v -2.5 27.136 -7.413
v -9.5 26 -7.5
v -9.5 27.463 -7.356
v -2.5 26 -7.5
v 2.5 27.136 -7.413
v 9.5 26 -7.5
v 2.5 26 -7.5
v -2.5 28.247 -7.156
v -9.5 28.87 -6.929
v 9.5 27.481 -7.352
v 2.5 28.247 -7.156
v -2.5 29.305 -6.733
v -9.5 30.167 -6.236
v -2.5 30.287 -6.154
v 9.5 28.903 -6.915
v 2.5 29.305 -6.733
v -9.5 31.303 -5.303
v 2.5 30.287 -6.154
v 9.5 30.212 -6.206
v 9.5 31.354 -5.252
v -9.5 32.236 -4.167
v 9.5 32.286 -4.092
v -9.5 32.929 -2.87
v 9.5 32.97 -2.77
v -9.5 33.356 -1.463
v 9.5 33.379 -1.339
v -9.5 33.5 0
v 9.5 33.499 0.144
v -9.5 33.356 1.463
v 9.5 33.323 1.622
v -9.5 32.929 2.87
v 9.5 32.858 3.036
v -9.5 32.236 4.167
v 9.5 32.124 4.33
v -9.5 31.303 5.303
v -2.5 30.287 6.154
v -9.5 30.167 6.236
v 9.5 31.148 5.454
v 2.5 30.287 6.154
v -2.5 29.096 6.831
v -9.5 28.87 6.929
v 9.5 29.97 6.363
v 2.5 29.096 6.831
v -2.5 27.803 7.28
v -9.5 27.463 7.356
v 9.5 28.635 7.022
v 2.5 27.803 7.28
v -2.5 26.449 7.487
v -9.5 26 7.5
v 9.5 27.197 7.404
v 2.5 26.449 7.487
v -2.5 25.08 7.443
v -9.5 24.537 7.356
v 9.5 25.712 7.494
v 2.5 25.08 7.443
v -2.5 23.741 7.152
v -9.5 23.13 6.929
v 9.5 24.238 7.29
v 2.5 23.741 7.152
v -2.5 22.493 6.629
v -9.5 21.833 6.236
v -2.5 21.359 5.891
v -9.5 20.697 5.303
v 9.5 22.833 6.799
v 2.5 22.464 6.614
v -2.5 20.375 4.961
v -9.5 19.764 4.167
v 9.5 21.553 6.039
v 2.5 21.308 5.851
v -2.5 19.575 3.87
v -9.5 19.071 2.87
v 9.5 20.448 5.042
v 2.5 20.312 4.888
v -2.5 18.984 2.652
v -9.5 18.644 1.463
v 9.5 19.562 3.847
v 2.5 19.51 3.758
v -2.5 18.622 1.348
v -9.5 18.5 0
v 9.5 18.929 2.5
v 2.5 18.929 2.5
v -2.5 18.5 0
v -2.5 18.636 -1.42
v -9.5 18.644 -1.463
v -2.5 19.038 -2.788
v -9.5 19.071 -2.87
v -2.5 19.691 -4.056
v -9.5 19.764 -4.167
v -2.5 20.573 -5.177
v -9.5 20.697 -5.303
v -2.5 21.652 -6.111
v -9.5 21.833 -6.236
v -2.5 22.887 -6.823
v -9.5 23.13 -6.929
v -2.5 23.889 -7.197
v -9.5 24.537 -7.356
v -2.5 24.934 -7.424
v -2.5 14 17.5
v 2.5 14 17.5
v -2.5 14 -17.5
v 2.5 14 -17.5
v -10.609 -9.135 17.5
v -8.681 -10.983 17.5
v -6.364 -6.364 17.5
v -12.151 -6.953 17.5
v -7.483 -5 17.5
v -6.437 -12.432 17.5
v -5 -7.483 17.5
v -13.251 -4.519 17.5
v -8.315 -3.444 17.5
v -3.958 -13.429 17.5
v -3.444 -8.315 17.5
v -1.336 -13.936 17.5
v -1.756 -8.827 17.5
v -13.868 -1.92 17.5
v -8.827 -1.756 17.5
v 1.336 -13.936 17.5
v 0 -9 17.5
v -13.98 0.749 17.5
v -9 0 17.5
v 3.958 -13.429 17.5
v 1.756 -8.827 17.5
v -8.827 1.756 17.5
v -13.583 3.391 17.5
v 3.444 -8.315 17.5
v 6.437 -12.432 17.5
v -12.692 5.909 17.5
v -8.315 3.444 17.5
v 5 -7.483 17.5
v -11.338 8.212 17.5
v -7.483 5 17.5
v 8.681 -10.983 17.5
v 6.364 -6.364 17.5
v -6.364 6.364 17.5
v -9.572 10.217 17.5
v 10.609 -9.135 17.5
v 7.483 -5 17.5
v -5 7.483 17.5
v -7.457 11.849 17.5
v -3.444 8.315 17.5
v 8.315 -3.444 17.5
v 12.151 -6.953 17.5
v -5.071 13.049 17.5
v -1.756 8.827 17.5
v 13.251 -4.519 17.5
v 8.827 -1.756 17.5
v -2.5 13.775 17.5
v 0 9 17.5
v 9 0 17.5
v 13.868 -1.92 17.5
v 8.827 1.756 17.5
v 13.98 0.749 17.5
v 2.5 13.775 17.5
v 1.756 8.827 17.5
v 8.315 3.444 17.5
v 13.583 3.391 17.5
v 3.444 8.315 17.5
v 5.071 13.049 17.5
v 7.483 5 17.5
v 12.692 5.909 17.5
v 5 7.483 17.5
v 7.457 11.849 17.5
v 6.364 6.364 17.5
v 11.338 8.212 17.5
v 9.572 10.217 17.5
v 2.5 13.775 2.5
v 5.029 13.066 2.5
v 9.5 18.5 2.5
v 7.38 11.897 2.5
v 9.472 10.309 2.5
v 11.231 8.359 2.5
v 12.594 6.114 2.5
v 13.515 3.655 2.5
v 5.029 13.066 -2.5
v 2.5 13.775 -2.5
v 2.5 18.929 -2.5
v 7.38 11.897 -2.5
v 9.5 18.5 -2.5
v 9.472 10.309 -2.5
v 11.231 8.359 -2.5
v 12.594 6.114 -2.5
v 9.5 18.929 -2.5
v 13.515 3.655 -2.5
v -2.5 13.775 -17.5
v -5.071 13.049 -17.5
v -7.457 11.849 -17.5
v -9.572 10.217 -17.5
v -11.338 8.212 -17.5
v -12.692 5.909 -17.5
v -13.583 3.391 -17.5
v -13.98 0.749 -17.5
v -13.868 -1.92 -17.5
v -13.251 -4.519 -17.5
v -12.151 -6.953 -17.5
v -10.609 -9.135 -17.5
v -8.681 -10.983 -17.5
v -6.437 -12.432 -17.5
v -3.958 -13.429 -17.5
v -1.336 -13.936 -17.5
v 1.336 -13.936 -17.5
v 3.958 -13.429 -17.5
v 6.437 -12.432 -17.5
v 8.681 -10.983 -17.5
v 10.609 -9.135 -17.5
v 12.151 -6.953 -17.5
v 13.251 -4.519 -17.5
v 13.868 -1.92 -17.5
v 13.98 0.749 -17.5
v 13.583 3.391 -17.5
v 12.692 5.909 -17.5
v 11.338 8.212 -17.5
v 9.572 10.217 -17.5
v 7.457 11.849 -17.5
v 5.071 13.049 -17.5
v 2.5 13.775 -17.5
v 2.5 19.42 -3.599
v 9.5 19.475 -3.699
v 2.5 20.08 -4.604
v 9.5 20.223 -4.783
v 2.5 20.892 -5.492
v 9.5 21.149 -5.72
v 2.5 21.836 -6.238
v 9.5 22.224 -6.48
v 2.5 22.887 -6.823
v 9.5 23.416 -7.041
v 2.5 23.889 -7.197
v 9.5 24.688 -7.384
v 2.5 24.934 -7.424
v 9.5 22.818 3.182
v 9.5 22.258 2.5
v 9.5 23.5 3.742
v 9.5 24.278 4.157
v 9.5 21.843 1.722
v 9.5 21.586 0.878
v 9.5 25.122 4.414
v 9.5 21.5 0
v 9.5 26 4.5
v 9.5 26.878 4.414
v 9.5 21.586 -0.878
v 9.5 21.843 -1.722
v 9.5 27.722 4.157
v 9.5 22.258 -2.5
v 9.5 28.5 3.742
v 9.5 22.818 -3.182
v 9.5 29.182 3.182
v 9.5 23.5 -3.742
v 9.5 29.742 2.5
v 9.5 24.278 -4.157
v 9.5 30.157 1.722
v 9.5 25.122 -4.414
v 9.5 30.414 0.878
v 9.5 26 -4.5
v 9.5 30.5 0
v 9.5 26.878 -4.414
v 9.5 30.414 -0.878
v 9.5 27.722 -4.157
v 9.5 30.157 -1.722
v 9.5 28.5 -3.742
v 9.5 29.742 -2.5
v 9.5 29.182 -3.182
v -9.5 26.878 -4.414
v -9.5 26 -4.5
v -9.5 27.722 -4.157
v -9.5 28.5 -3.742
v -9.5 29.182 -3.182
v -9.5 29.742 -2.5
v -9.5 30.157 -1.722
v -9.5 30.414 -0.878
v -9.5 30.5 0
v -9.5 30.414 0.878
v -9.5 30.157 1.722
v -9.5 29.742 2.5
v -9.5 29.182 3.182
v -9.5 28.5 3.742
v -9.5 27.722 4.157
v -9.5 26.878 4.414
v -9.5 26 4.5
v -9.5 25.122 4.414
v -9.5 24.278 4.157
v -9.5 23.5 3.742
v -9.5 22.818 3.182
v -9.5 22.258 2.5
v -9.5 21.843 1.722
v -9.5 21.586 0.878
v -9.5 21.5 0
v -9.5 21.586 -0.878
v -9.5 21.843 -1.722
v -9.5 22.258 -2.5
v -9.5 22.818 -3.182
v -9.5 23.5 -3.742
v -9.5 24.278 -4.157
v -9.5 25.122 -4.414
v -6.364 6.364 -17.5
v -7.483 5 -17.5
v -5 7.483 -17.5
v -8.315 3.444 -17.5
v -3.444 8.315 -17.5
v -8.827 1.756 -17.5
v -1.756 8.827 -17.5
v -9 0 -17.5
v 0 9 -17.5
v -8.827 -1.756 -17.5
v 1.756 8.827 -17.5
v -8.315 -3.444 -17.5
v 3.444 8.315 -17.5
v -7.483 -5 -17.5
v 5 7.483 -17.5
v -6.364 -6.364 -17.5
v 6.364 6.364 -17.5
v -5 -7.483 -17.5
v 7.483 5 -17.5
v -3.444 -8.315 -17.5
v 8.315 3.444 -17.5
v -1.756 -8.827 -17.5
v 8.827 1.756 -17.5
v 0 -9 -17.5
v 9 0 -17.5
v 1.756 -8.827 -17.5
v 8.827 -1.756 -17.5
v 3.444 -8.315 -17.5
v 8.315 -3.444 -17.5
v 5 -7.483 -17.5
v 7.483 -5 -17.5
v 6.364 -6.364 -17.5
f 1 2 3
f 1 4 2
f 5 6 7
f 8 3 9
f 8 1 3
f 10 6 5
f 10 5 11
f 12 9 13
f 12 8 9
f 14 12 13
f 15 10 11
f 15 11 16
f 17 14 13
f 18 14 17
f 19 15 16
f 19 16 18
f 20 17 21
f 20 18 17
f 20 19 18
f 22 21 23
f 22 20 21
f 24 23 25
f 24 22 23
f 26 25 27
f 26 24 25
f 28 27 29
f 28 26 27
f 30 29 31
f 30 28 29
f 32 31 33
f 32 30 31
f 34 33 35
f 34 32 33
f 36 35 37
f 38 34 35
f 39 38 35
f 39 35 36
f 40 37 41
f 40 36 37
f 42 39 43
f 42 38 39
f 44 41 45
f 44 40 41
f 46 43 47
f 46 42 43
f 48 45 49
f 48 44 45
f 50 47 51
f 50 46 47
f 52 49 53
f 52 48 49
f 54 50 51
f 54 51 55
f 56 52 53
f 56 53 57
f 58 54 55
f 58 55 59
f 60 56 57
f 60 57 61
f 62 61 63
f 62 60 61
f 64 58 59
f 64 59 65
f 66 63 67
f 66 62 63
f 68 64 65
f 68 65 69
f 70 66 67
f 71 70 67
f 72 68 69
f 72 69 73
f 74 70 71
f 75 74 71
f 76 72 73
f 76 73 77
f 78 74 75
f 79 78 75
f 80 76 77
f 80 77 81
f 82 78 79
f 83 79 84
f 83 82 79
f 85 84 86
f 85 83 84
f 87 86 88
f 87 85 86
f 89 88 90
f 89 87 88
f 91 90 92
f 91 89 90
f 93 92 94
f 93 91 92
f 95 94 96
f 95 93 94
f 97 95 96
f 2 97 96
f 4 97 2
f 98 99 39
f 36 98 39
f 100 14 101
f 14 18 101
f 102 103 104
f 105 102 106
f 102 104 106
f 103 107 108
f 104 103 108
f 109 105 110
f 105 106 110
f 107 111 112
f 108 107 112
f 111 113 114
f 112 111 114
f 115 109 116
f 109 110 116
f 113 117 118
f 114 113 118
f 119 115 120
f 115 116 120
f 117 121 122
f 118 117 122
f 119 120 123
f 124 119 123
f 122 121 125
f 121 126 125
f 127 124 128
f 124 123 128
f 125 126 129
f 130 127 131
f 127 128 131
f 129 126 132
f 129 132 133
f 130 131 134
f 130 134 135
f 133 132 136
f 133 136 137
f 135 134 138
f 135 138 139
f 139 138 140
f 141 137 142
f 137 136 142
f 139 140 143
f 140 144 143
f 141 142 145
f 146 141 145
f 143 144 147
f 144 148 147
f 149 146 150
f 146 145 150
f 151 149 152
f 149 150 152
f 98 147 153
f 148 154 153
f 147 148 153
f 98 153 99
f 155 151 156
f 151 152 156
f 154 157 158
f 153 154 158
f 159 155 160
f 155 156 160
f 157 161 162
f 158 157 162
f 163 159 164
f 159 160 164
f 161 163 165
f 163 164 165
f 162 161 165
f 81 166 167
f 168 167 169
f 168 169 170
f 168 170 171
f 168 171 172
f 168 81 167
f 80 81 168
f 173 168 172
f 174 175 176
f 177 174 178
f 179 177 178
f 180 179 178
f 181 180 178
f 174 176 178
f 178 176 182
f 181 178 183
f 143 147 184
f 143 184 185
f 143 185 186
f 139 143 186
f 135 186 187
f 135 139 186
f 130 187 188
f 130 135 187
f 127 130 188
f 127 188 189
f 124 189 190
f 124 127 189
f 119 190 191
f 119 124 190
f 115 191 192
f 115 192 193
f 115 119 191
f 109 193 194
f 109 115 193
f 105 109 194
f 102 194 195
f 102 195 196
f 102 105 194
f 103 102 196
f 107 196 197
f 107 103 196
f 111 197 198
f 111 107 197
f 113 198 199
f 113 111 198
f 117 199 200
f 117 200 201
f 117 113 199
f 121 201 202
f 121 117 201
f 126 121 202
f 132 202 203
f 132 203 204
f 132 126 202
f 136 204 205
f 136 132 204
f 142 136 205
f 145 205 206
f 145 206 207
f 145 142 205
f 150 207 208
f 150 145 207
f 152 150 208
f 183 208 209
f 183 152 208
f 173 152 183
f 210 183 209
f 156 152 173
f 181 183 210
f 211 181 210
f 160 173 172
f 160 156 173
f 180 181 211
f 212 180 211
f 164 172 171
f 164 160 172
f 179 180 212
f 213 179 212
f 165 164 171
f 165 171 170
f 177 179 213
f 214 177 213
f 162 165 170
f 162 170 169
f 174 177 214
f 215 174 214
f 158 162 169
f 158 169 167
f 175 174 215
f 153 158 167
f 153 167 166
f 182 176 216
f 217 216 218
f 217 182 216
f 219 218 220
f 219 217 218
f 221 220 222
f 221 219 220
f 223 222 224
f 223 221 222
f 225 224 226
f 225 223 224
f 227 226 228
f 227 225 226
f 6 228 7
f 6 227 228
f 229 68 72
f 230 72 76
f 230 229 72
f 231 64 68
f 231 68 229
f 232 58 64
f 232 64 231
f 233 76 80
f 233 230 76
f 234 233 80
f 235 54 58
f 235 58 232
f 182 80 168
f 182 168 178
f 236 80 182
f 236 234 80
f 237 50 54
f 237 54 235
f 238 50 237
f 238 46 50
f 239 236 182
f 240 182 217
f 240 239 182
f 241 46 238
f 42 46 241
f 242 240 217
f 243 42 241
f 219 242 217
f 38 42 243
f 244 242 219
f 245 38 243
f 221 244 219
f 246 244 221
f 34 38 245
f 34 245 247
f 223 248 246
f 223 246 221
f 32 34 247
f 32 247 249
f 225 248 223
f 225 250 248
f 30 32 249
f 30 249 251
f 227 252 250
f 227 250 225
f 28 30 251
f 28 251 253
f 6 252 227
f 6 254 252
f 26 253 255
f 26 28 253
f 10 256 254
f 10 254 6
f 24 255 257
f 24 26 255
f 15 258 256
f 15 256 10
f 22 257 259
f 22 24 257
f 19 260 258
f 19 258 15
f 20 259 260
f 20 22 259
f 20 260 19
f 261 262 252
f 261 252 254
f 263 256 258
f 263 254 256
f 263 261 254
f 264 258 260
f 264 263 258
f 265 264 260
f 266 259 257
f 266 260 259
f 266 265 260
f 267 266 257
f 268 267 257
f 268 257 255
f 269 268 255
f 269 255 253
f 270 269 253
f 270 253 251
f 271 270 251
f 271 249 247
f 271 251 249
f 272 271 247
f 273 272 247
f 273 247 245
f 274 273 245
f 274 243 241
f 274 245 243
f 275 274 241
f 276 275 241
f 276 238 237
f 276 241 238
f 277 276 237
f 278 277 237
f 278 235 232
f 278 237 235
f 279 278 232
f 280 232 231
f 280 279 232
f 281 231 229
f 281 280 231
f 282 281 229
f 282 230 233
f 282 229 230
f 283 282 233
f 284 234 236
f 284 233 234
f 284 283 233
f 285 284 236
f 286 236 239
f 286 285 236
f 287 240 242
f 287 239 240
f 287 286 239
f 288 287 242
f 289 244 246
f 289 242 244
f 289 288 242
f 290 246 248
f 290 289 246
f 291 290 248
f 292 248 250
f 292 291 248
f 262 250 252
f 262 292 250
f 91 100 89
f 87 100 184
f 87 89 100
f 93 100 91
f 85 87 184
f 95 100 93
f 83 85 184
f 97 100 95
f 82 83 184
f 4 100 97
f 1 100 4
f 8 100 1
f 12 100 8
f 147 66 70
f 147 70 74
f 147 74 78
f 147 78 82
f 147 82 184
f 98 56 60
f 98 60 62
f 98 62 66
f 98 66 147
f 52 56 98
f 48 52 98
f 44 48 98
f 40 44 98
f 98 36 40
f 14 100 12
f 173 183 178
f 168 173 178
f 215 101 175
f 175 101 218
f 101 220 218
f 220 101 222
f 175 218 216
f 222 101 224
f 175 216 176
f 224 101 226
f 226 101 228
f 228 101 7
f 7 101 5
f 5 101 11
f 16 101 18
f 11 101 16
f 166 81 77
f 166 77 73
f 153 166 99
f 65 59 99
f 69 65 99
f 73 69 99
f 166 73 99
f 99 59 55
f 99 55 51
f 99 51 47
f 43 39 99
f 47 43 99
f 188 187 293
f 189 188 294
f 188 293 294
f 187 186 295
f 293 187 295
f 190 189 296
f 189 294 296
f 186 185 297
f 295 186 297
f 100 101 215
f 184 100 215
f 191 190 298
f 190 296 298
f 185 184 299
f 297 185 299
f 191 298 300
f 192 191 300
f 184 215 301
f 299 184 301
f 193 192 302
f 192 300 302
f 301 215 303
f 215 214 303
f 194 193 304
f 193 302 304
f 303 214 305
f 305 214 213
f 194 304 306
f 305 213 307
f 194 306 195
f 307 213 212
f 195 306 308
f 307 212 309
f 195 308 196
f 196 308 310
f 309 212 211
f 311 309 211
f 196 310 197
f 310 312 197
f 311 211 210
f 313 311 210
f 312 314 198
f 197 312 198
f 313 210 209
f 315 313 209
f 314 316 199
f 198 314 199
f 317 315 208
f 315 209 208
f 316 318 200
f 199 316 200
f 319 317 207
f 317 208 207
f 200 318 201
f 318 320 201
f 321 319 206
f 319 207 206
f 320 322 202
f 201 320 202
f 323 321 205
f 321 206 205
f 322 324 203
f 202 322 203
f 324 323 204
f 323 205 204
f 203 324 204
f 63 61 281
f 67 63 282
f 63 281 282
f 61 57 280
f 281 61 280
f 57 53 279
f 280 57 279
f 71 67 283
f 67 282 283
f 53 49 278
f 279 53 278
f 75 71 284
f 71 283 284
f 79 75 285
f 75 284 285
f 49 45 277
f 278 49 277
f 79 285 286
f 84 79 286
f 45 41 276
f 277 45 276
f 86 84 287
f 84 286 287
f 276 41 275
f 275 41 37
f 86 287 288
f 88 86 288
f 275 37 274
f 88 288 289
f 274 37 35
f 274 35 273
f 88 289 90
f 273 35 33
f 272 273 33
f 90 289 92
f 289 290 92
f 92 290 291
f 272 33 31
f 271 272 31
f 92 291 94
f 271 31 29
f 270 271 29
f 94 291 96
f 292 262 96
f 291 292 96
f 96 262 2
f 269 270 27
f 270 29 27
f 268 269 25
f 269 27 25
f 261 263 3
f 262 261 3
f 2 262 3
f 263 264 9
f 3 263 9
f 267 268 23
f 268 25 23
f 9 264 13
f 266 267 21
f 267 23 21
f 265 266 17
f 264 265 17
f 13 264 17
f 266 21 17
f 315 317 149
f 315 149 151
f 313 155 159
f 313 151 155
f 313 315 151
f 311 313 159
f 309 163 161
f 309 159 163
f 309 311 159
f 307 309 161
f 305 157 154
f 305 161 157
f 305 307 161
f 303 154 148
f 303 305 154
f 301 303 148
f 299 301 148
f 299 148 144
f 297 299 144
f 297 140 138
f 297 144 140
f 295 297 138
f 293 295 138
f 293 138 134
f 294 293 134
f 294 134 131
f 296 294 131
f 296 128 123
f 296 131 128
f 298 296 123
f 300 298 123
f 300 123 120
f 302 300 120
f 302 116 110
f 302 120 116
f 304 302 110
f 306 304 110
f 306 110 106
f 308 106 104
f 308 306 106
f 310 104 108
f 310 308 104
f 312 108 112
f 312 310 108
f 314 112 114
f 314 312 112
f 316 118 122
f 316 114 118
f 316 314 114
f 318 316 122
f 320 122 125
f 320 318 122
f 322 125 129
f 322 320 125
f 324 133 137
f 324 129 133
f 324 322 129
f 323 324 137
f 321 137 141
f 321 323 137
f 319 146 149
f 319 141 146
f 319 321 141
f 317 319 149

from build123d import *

# Parameters (mm, degrees)
SKETCH1_R               = 14
BOSS_EXTRUDE1_DEPTH     = 17.5
CUT_EXTRUDE1_DEPTH      = 27.424420523
CUT_EXTRUDE1_DEPTH_BACK = 27.424420523
SKETCH2_R               = 9
SKETCH3_R               = 7.5
BOSS_EXTRUDE2_DEPTH     = 9.5
CUT_EXTRUDE2_DEPTH      = 45.505617623
CUT_EXTRUDE2_DEPTH_BACK = 45.505617623
SKETCH4_R               = 4.5
BOSS_EXTRUDE3_DEPTH     = 2.5
RIB3_START              = -2.5
RIB3_DEPTH              = 5


with BuildPart() as part:
    # Sketch1 → Boss-Extrude1 (new, symmetric)
    with BuildSketch(Plane.XY):
        Circle(SKETCH1_R)
    extrude(amount=BOSS_EXTRUDE1_DEPTH, both=True)

    # Sketch2 → Cut-Extrude1 (cut, two sides: drawn at the far end of the back side and taken through both)
    with BuildSketch(Plane.XY.offset(-CUT_EXTRUDE1_DEPTH_BACK)):
        Circle(SKETCH2_R)
    extrude(amount=CUT_EXTRUDE1_DEPTH + CUT_EXTRUDE1_DEPTH_BACK, mode=Mode.SUBTRACT)



with BuildPart() as body_2:
    # Sketch3 → Boss-Extrude2 (new, symmetric)
    with BuildSketch(Plane(origin=(0, 0, 0), x_dir=(0, 0, -1), z_dir=(1, 0, 0))):
        with Locations((0, 26)):
            Circle(SKETCH3_R)
    extrude(amount=BOSS_EXTRUDE2_DEPTH, both=True)

    # Sketch4 → Cut-Extrude2 (cut, two sides: drawn at the far end of the back side and taken through both)
    with BuildSketch(Plane(origin=(9.5, 0, 0), x_dir=(0, 0, -1), z_dir=(1, 0, 0)).offset(-CUT_EXTRUDE2_DEPTH_BACK)):
        with Locations((0, 26)):
            Circle(SKETCH4_R)
    extrude(amount=CUT_EXTRUDE2_DEPTH + CUT_EXTRUDE2_DEPTH_BACK, mode=Mode.SUBTRACT)


with BuildPart() as part_1:
    add(part.part)

    add(body_2.part)  # Boss-Extrude3 merges body 2
    # Sketch5 → Boss-Extrude3 (add, symmetric)
    with BuildSketch(Plane(origin=(0, 0, 0), x_dir=(0, 0, -1), z_dir=(1, 0, 0))):
        with BuildLine():
            Line((-17.5, 14), (-6.153967777, 30.287036342))
            ThreePointArc((-6.153967777, 30.287036342), (-7.414340436, 27.130290186), (-7.151829247, 23.741385731))
            ThreePointArc((-7.151829247, 23.741385731), (-4.43341815, 19.950636107), (0, 18.5))
            ThreePointArc((0, 18.5), (4.056082014, 19.691418646), (6.823499563, 22.887147015))
            ThreePointArc((6.823499563, 22.887147015), (7.328923752, 24.407242442), (7.5, 26))
            ThreePointArc((7.5, 26), (7.155583775, 28.246691086), (6.153967777, 30.287036342))
            Line((6.153967777, 30.287036342), (17.5, 14))
            Line((17.5, 14), (17.5, 12.5))
            Line((17.5, 12.5), (-17.5, 12.5))
            Line((-17.5, 12.5), (-17.5, 14))
        make_face()
    extrude(amount=BOSS_EXTRUDE3_DEPTH, both=True)

    # Rib3: read off the stored shape, not the designer's step
    # Rib3 outline → Rib3 (add)
    with BuildSketch(Plane.XY.offset(RIB3_START)):
        with BuildLine():
            Line((9.5, 18.928932188), (2.5, 18.928932188))
            Line((2.5, 18.928932188), (2.5, 13.774977314))
            ThreePointArc((2.5, 13.774977314), (9.472147799, 10.309142354), (13.514557534, 3.654686672))
            Line((13.514557534, 3.654686672), (9.5, 18.5))
            Line((9.5, 18.5), (9.5, 18.928932188))
        make_face()
    extrude(amount=RIB3_DEPTH)


solid = part_1.part
